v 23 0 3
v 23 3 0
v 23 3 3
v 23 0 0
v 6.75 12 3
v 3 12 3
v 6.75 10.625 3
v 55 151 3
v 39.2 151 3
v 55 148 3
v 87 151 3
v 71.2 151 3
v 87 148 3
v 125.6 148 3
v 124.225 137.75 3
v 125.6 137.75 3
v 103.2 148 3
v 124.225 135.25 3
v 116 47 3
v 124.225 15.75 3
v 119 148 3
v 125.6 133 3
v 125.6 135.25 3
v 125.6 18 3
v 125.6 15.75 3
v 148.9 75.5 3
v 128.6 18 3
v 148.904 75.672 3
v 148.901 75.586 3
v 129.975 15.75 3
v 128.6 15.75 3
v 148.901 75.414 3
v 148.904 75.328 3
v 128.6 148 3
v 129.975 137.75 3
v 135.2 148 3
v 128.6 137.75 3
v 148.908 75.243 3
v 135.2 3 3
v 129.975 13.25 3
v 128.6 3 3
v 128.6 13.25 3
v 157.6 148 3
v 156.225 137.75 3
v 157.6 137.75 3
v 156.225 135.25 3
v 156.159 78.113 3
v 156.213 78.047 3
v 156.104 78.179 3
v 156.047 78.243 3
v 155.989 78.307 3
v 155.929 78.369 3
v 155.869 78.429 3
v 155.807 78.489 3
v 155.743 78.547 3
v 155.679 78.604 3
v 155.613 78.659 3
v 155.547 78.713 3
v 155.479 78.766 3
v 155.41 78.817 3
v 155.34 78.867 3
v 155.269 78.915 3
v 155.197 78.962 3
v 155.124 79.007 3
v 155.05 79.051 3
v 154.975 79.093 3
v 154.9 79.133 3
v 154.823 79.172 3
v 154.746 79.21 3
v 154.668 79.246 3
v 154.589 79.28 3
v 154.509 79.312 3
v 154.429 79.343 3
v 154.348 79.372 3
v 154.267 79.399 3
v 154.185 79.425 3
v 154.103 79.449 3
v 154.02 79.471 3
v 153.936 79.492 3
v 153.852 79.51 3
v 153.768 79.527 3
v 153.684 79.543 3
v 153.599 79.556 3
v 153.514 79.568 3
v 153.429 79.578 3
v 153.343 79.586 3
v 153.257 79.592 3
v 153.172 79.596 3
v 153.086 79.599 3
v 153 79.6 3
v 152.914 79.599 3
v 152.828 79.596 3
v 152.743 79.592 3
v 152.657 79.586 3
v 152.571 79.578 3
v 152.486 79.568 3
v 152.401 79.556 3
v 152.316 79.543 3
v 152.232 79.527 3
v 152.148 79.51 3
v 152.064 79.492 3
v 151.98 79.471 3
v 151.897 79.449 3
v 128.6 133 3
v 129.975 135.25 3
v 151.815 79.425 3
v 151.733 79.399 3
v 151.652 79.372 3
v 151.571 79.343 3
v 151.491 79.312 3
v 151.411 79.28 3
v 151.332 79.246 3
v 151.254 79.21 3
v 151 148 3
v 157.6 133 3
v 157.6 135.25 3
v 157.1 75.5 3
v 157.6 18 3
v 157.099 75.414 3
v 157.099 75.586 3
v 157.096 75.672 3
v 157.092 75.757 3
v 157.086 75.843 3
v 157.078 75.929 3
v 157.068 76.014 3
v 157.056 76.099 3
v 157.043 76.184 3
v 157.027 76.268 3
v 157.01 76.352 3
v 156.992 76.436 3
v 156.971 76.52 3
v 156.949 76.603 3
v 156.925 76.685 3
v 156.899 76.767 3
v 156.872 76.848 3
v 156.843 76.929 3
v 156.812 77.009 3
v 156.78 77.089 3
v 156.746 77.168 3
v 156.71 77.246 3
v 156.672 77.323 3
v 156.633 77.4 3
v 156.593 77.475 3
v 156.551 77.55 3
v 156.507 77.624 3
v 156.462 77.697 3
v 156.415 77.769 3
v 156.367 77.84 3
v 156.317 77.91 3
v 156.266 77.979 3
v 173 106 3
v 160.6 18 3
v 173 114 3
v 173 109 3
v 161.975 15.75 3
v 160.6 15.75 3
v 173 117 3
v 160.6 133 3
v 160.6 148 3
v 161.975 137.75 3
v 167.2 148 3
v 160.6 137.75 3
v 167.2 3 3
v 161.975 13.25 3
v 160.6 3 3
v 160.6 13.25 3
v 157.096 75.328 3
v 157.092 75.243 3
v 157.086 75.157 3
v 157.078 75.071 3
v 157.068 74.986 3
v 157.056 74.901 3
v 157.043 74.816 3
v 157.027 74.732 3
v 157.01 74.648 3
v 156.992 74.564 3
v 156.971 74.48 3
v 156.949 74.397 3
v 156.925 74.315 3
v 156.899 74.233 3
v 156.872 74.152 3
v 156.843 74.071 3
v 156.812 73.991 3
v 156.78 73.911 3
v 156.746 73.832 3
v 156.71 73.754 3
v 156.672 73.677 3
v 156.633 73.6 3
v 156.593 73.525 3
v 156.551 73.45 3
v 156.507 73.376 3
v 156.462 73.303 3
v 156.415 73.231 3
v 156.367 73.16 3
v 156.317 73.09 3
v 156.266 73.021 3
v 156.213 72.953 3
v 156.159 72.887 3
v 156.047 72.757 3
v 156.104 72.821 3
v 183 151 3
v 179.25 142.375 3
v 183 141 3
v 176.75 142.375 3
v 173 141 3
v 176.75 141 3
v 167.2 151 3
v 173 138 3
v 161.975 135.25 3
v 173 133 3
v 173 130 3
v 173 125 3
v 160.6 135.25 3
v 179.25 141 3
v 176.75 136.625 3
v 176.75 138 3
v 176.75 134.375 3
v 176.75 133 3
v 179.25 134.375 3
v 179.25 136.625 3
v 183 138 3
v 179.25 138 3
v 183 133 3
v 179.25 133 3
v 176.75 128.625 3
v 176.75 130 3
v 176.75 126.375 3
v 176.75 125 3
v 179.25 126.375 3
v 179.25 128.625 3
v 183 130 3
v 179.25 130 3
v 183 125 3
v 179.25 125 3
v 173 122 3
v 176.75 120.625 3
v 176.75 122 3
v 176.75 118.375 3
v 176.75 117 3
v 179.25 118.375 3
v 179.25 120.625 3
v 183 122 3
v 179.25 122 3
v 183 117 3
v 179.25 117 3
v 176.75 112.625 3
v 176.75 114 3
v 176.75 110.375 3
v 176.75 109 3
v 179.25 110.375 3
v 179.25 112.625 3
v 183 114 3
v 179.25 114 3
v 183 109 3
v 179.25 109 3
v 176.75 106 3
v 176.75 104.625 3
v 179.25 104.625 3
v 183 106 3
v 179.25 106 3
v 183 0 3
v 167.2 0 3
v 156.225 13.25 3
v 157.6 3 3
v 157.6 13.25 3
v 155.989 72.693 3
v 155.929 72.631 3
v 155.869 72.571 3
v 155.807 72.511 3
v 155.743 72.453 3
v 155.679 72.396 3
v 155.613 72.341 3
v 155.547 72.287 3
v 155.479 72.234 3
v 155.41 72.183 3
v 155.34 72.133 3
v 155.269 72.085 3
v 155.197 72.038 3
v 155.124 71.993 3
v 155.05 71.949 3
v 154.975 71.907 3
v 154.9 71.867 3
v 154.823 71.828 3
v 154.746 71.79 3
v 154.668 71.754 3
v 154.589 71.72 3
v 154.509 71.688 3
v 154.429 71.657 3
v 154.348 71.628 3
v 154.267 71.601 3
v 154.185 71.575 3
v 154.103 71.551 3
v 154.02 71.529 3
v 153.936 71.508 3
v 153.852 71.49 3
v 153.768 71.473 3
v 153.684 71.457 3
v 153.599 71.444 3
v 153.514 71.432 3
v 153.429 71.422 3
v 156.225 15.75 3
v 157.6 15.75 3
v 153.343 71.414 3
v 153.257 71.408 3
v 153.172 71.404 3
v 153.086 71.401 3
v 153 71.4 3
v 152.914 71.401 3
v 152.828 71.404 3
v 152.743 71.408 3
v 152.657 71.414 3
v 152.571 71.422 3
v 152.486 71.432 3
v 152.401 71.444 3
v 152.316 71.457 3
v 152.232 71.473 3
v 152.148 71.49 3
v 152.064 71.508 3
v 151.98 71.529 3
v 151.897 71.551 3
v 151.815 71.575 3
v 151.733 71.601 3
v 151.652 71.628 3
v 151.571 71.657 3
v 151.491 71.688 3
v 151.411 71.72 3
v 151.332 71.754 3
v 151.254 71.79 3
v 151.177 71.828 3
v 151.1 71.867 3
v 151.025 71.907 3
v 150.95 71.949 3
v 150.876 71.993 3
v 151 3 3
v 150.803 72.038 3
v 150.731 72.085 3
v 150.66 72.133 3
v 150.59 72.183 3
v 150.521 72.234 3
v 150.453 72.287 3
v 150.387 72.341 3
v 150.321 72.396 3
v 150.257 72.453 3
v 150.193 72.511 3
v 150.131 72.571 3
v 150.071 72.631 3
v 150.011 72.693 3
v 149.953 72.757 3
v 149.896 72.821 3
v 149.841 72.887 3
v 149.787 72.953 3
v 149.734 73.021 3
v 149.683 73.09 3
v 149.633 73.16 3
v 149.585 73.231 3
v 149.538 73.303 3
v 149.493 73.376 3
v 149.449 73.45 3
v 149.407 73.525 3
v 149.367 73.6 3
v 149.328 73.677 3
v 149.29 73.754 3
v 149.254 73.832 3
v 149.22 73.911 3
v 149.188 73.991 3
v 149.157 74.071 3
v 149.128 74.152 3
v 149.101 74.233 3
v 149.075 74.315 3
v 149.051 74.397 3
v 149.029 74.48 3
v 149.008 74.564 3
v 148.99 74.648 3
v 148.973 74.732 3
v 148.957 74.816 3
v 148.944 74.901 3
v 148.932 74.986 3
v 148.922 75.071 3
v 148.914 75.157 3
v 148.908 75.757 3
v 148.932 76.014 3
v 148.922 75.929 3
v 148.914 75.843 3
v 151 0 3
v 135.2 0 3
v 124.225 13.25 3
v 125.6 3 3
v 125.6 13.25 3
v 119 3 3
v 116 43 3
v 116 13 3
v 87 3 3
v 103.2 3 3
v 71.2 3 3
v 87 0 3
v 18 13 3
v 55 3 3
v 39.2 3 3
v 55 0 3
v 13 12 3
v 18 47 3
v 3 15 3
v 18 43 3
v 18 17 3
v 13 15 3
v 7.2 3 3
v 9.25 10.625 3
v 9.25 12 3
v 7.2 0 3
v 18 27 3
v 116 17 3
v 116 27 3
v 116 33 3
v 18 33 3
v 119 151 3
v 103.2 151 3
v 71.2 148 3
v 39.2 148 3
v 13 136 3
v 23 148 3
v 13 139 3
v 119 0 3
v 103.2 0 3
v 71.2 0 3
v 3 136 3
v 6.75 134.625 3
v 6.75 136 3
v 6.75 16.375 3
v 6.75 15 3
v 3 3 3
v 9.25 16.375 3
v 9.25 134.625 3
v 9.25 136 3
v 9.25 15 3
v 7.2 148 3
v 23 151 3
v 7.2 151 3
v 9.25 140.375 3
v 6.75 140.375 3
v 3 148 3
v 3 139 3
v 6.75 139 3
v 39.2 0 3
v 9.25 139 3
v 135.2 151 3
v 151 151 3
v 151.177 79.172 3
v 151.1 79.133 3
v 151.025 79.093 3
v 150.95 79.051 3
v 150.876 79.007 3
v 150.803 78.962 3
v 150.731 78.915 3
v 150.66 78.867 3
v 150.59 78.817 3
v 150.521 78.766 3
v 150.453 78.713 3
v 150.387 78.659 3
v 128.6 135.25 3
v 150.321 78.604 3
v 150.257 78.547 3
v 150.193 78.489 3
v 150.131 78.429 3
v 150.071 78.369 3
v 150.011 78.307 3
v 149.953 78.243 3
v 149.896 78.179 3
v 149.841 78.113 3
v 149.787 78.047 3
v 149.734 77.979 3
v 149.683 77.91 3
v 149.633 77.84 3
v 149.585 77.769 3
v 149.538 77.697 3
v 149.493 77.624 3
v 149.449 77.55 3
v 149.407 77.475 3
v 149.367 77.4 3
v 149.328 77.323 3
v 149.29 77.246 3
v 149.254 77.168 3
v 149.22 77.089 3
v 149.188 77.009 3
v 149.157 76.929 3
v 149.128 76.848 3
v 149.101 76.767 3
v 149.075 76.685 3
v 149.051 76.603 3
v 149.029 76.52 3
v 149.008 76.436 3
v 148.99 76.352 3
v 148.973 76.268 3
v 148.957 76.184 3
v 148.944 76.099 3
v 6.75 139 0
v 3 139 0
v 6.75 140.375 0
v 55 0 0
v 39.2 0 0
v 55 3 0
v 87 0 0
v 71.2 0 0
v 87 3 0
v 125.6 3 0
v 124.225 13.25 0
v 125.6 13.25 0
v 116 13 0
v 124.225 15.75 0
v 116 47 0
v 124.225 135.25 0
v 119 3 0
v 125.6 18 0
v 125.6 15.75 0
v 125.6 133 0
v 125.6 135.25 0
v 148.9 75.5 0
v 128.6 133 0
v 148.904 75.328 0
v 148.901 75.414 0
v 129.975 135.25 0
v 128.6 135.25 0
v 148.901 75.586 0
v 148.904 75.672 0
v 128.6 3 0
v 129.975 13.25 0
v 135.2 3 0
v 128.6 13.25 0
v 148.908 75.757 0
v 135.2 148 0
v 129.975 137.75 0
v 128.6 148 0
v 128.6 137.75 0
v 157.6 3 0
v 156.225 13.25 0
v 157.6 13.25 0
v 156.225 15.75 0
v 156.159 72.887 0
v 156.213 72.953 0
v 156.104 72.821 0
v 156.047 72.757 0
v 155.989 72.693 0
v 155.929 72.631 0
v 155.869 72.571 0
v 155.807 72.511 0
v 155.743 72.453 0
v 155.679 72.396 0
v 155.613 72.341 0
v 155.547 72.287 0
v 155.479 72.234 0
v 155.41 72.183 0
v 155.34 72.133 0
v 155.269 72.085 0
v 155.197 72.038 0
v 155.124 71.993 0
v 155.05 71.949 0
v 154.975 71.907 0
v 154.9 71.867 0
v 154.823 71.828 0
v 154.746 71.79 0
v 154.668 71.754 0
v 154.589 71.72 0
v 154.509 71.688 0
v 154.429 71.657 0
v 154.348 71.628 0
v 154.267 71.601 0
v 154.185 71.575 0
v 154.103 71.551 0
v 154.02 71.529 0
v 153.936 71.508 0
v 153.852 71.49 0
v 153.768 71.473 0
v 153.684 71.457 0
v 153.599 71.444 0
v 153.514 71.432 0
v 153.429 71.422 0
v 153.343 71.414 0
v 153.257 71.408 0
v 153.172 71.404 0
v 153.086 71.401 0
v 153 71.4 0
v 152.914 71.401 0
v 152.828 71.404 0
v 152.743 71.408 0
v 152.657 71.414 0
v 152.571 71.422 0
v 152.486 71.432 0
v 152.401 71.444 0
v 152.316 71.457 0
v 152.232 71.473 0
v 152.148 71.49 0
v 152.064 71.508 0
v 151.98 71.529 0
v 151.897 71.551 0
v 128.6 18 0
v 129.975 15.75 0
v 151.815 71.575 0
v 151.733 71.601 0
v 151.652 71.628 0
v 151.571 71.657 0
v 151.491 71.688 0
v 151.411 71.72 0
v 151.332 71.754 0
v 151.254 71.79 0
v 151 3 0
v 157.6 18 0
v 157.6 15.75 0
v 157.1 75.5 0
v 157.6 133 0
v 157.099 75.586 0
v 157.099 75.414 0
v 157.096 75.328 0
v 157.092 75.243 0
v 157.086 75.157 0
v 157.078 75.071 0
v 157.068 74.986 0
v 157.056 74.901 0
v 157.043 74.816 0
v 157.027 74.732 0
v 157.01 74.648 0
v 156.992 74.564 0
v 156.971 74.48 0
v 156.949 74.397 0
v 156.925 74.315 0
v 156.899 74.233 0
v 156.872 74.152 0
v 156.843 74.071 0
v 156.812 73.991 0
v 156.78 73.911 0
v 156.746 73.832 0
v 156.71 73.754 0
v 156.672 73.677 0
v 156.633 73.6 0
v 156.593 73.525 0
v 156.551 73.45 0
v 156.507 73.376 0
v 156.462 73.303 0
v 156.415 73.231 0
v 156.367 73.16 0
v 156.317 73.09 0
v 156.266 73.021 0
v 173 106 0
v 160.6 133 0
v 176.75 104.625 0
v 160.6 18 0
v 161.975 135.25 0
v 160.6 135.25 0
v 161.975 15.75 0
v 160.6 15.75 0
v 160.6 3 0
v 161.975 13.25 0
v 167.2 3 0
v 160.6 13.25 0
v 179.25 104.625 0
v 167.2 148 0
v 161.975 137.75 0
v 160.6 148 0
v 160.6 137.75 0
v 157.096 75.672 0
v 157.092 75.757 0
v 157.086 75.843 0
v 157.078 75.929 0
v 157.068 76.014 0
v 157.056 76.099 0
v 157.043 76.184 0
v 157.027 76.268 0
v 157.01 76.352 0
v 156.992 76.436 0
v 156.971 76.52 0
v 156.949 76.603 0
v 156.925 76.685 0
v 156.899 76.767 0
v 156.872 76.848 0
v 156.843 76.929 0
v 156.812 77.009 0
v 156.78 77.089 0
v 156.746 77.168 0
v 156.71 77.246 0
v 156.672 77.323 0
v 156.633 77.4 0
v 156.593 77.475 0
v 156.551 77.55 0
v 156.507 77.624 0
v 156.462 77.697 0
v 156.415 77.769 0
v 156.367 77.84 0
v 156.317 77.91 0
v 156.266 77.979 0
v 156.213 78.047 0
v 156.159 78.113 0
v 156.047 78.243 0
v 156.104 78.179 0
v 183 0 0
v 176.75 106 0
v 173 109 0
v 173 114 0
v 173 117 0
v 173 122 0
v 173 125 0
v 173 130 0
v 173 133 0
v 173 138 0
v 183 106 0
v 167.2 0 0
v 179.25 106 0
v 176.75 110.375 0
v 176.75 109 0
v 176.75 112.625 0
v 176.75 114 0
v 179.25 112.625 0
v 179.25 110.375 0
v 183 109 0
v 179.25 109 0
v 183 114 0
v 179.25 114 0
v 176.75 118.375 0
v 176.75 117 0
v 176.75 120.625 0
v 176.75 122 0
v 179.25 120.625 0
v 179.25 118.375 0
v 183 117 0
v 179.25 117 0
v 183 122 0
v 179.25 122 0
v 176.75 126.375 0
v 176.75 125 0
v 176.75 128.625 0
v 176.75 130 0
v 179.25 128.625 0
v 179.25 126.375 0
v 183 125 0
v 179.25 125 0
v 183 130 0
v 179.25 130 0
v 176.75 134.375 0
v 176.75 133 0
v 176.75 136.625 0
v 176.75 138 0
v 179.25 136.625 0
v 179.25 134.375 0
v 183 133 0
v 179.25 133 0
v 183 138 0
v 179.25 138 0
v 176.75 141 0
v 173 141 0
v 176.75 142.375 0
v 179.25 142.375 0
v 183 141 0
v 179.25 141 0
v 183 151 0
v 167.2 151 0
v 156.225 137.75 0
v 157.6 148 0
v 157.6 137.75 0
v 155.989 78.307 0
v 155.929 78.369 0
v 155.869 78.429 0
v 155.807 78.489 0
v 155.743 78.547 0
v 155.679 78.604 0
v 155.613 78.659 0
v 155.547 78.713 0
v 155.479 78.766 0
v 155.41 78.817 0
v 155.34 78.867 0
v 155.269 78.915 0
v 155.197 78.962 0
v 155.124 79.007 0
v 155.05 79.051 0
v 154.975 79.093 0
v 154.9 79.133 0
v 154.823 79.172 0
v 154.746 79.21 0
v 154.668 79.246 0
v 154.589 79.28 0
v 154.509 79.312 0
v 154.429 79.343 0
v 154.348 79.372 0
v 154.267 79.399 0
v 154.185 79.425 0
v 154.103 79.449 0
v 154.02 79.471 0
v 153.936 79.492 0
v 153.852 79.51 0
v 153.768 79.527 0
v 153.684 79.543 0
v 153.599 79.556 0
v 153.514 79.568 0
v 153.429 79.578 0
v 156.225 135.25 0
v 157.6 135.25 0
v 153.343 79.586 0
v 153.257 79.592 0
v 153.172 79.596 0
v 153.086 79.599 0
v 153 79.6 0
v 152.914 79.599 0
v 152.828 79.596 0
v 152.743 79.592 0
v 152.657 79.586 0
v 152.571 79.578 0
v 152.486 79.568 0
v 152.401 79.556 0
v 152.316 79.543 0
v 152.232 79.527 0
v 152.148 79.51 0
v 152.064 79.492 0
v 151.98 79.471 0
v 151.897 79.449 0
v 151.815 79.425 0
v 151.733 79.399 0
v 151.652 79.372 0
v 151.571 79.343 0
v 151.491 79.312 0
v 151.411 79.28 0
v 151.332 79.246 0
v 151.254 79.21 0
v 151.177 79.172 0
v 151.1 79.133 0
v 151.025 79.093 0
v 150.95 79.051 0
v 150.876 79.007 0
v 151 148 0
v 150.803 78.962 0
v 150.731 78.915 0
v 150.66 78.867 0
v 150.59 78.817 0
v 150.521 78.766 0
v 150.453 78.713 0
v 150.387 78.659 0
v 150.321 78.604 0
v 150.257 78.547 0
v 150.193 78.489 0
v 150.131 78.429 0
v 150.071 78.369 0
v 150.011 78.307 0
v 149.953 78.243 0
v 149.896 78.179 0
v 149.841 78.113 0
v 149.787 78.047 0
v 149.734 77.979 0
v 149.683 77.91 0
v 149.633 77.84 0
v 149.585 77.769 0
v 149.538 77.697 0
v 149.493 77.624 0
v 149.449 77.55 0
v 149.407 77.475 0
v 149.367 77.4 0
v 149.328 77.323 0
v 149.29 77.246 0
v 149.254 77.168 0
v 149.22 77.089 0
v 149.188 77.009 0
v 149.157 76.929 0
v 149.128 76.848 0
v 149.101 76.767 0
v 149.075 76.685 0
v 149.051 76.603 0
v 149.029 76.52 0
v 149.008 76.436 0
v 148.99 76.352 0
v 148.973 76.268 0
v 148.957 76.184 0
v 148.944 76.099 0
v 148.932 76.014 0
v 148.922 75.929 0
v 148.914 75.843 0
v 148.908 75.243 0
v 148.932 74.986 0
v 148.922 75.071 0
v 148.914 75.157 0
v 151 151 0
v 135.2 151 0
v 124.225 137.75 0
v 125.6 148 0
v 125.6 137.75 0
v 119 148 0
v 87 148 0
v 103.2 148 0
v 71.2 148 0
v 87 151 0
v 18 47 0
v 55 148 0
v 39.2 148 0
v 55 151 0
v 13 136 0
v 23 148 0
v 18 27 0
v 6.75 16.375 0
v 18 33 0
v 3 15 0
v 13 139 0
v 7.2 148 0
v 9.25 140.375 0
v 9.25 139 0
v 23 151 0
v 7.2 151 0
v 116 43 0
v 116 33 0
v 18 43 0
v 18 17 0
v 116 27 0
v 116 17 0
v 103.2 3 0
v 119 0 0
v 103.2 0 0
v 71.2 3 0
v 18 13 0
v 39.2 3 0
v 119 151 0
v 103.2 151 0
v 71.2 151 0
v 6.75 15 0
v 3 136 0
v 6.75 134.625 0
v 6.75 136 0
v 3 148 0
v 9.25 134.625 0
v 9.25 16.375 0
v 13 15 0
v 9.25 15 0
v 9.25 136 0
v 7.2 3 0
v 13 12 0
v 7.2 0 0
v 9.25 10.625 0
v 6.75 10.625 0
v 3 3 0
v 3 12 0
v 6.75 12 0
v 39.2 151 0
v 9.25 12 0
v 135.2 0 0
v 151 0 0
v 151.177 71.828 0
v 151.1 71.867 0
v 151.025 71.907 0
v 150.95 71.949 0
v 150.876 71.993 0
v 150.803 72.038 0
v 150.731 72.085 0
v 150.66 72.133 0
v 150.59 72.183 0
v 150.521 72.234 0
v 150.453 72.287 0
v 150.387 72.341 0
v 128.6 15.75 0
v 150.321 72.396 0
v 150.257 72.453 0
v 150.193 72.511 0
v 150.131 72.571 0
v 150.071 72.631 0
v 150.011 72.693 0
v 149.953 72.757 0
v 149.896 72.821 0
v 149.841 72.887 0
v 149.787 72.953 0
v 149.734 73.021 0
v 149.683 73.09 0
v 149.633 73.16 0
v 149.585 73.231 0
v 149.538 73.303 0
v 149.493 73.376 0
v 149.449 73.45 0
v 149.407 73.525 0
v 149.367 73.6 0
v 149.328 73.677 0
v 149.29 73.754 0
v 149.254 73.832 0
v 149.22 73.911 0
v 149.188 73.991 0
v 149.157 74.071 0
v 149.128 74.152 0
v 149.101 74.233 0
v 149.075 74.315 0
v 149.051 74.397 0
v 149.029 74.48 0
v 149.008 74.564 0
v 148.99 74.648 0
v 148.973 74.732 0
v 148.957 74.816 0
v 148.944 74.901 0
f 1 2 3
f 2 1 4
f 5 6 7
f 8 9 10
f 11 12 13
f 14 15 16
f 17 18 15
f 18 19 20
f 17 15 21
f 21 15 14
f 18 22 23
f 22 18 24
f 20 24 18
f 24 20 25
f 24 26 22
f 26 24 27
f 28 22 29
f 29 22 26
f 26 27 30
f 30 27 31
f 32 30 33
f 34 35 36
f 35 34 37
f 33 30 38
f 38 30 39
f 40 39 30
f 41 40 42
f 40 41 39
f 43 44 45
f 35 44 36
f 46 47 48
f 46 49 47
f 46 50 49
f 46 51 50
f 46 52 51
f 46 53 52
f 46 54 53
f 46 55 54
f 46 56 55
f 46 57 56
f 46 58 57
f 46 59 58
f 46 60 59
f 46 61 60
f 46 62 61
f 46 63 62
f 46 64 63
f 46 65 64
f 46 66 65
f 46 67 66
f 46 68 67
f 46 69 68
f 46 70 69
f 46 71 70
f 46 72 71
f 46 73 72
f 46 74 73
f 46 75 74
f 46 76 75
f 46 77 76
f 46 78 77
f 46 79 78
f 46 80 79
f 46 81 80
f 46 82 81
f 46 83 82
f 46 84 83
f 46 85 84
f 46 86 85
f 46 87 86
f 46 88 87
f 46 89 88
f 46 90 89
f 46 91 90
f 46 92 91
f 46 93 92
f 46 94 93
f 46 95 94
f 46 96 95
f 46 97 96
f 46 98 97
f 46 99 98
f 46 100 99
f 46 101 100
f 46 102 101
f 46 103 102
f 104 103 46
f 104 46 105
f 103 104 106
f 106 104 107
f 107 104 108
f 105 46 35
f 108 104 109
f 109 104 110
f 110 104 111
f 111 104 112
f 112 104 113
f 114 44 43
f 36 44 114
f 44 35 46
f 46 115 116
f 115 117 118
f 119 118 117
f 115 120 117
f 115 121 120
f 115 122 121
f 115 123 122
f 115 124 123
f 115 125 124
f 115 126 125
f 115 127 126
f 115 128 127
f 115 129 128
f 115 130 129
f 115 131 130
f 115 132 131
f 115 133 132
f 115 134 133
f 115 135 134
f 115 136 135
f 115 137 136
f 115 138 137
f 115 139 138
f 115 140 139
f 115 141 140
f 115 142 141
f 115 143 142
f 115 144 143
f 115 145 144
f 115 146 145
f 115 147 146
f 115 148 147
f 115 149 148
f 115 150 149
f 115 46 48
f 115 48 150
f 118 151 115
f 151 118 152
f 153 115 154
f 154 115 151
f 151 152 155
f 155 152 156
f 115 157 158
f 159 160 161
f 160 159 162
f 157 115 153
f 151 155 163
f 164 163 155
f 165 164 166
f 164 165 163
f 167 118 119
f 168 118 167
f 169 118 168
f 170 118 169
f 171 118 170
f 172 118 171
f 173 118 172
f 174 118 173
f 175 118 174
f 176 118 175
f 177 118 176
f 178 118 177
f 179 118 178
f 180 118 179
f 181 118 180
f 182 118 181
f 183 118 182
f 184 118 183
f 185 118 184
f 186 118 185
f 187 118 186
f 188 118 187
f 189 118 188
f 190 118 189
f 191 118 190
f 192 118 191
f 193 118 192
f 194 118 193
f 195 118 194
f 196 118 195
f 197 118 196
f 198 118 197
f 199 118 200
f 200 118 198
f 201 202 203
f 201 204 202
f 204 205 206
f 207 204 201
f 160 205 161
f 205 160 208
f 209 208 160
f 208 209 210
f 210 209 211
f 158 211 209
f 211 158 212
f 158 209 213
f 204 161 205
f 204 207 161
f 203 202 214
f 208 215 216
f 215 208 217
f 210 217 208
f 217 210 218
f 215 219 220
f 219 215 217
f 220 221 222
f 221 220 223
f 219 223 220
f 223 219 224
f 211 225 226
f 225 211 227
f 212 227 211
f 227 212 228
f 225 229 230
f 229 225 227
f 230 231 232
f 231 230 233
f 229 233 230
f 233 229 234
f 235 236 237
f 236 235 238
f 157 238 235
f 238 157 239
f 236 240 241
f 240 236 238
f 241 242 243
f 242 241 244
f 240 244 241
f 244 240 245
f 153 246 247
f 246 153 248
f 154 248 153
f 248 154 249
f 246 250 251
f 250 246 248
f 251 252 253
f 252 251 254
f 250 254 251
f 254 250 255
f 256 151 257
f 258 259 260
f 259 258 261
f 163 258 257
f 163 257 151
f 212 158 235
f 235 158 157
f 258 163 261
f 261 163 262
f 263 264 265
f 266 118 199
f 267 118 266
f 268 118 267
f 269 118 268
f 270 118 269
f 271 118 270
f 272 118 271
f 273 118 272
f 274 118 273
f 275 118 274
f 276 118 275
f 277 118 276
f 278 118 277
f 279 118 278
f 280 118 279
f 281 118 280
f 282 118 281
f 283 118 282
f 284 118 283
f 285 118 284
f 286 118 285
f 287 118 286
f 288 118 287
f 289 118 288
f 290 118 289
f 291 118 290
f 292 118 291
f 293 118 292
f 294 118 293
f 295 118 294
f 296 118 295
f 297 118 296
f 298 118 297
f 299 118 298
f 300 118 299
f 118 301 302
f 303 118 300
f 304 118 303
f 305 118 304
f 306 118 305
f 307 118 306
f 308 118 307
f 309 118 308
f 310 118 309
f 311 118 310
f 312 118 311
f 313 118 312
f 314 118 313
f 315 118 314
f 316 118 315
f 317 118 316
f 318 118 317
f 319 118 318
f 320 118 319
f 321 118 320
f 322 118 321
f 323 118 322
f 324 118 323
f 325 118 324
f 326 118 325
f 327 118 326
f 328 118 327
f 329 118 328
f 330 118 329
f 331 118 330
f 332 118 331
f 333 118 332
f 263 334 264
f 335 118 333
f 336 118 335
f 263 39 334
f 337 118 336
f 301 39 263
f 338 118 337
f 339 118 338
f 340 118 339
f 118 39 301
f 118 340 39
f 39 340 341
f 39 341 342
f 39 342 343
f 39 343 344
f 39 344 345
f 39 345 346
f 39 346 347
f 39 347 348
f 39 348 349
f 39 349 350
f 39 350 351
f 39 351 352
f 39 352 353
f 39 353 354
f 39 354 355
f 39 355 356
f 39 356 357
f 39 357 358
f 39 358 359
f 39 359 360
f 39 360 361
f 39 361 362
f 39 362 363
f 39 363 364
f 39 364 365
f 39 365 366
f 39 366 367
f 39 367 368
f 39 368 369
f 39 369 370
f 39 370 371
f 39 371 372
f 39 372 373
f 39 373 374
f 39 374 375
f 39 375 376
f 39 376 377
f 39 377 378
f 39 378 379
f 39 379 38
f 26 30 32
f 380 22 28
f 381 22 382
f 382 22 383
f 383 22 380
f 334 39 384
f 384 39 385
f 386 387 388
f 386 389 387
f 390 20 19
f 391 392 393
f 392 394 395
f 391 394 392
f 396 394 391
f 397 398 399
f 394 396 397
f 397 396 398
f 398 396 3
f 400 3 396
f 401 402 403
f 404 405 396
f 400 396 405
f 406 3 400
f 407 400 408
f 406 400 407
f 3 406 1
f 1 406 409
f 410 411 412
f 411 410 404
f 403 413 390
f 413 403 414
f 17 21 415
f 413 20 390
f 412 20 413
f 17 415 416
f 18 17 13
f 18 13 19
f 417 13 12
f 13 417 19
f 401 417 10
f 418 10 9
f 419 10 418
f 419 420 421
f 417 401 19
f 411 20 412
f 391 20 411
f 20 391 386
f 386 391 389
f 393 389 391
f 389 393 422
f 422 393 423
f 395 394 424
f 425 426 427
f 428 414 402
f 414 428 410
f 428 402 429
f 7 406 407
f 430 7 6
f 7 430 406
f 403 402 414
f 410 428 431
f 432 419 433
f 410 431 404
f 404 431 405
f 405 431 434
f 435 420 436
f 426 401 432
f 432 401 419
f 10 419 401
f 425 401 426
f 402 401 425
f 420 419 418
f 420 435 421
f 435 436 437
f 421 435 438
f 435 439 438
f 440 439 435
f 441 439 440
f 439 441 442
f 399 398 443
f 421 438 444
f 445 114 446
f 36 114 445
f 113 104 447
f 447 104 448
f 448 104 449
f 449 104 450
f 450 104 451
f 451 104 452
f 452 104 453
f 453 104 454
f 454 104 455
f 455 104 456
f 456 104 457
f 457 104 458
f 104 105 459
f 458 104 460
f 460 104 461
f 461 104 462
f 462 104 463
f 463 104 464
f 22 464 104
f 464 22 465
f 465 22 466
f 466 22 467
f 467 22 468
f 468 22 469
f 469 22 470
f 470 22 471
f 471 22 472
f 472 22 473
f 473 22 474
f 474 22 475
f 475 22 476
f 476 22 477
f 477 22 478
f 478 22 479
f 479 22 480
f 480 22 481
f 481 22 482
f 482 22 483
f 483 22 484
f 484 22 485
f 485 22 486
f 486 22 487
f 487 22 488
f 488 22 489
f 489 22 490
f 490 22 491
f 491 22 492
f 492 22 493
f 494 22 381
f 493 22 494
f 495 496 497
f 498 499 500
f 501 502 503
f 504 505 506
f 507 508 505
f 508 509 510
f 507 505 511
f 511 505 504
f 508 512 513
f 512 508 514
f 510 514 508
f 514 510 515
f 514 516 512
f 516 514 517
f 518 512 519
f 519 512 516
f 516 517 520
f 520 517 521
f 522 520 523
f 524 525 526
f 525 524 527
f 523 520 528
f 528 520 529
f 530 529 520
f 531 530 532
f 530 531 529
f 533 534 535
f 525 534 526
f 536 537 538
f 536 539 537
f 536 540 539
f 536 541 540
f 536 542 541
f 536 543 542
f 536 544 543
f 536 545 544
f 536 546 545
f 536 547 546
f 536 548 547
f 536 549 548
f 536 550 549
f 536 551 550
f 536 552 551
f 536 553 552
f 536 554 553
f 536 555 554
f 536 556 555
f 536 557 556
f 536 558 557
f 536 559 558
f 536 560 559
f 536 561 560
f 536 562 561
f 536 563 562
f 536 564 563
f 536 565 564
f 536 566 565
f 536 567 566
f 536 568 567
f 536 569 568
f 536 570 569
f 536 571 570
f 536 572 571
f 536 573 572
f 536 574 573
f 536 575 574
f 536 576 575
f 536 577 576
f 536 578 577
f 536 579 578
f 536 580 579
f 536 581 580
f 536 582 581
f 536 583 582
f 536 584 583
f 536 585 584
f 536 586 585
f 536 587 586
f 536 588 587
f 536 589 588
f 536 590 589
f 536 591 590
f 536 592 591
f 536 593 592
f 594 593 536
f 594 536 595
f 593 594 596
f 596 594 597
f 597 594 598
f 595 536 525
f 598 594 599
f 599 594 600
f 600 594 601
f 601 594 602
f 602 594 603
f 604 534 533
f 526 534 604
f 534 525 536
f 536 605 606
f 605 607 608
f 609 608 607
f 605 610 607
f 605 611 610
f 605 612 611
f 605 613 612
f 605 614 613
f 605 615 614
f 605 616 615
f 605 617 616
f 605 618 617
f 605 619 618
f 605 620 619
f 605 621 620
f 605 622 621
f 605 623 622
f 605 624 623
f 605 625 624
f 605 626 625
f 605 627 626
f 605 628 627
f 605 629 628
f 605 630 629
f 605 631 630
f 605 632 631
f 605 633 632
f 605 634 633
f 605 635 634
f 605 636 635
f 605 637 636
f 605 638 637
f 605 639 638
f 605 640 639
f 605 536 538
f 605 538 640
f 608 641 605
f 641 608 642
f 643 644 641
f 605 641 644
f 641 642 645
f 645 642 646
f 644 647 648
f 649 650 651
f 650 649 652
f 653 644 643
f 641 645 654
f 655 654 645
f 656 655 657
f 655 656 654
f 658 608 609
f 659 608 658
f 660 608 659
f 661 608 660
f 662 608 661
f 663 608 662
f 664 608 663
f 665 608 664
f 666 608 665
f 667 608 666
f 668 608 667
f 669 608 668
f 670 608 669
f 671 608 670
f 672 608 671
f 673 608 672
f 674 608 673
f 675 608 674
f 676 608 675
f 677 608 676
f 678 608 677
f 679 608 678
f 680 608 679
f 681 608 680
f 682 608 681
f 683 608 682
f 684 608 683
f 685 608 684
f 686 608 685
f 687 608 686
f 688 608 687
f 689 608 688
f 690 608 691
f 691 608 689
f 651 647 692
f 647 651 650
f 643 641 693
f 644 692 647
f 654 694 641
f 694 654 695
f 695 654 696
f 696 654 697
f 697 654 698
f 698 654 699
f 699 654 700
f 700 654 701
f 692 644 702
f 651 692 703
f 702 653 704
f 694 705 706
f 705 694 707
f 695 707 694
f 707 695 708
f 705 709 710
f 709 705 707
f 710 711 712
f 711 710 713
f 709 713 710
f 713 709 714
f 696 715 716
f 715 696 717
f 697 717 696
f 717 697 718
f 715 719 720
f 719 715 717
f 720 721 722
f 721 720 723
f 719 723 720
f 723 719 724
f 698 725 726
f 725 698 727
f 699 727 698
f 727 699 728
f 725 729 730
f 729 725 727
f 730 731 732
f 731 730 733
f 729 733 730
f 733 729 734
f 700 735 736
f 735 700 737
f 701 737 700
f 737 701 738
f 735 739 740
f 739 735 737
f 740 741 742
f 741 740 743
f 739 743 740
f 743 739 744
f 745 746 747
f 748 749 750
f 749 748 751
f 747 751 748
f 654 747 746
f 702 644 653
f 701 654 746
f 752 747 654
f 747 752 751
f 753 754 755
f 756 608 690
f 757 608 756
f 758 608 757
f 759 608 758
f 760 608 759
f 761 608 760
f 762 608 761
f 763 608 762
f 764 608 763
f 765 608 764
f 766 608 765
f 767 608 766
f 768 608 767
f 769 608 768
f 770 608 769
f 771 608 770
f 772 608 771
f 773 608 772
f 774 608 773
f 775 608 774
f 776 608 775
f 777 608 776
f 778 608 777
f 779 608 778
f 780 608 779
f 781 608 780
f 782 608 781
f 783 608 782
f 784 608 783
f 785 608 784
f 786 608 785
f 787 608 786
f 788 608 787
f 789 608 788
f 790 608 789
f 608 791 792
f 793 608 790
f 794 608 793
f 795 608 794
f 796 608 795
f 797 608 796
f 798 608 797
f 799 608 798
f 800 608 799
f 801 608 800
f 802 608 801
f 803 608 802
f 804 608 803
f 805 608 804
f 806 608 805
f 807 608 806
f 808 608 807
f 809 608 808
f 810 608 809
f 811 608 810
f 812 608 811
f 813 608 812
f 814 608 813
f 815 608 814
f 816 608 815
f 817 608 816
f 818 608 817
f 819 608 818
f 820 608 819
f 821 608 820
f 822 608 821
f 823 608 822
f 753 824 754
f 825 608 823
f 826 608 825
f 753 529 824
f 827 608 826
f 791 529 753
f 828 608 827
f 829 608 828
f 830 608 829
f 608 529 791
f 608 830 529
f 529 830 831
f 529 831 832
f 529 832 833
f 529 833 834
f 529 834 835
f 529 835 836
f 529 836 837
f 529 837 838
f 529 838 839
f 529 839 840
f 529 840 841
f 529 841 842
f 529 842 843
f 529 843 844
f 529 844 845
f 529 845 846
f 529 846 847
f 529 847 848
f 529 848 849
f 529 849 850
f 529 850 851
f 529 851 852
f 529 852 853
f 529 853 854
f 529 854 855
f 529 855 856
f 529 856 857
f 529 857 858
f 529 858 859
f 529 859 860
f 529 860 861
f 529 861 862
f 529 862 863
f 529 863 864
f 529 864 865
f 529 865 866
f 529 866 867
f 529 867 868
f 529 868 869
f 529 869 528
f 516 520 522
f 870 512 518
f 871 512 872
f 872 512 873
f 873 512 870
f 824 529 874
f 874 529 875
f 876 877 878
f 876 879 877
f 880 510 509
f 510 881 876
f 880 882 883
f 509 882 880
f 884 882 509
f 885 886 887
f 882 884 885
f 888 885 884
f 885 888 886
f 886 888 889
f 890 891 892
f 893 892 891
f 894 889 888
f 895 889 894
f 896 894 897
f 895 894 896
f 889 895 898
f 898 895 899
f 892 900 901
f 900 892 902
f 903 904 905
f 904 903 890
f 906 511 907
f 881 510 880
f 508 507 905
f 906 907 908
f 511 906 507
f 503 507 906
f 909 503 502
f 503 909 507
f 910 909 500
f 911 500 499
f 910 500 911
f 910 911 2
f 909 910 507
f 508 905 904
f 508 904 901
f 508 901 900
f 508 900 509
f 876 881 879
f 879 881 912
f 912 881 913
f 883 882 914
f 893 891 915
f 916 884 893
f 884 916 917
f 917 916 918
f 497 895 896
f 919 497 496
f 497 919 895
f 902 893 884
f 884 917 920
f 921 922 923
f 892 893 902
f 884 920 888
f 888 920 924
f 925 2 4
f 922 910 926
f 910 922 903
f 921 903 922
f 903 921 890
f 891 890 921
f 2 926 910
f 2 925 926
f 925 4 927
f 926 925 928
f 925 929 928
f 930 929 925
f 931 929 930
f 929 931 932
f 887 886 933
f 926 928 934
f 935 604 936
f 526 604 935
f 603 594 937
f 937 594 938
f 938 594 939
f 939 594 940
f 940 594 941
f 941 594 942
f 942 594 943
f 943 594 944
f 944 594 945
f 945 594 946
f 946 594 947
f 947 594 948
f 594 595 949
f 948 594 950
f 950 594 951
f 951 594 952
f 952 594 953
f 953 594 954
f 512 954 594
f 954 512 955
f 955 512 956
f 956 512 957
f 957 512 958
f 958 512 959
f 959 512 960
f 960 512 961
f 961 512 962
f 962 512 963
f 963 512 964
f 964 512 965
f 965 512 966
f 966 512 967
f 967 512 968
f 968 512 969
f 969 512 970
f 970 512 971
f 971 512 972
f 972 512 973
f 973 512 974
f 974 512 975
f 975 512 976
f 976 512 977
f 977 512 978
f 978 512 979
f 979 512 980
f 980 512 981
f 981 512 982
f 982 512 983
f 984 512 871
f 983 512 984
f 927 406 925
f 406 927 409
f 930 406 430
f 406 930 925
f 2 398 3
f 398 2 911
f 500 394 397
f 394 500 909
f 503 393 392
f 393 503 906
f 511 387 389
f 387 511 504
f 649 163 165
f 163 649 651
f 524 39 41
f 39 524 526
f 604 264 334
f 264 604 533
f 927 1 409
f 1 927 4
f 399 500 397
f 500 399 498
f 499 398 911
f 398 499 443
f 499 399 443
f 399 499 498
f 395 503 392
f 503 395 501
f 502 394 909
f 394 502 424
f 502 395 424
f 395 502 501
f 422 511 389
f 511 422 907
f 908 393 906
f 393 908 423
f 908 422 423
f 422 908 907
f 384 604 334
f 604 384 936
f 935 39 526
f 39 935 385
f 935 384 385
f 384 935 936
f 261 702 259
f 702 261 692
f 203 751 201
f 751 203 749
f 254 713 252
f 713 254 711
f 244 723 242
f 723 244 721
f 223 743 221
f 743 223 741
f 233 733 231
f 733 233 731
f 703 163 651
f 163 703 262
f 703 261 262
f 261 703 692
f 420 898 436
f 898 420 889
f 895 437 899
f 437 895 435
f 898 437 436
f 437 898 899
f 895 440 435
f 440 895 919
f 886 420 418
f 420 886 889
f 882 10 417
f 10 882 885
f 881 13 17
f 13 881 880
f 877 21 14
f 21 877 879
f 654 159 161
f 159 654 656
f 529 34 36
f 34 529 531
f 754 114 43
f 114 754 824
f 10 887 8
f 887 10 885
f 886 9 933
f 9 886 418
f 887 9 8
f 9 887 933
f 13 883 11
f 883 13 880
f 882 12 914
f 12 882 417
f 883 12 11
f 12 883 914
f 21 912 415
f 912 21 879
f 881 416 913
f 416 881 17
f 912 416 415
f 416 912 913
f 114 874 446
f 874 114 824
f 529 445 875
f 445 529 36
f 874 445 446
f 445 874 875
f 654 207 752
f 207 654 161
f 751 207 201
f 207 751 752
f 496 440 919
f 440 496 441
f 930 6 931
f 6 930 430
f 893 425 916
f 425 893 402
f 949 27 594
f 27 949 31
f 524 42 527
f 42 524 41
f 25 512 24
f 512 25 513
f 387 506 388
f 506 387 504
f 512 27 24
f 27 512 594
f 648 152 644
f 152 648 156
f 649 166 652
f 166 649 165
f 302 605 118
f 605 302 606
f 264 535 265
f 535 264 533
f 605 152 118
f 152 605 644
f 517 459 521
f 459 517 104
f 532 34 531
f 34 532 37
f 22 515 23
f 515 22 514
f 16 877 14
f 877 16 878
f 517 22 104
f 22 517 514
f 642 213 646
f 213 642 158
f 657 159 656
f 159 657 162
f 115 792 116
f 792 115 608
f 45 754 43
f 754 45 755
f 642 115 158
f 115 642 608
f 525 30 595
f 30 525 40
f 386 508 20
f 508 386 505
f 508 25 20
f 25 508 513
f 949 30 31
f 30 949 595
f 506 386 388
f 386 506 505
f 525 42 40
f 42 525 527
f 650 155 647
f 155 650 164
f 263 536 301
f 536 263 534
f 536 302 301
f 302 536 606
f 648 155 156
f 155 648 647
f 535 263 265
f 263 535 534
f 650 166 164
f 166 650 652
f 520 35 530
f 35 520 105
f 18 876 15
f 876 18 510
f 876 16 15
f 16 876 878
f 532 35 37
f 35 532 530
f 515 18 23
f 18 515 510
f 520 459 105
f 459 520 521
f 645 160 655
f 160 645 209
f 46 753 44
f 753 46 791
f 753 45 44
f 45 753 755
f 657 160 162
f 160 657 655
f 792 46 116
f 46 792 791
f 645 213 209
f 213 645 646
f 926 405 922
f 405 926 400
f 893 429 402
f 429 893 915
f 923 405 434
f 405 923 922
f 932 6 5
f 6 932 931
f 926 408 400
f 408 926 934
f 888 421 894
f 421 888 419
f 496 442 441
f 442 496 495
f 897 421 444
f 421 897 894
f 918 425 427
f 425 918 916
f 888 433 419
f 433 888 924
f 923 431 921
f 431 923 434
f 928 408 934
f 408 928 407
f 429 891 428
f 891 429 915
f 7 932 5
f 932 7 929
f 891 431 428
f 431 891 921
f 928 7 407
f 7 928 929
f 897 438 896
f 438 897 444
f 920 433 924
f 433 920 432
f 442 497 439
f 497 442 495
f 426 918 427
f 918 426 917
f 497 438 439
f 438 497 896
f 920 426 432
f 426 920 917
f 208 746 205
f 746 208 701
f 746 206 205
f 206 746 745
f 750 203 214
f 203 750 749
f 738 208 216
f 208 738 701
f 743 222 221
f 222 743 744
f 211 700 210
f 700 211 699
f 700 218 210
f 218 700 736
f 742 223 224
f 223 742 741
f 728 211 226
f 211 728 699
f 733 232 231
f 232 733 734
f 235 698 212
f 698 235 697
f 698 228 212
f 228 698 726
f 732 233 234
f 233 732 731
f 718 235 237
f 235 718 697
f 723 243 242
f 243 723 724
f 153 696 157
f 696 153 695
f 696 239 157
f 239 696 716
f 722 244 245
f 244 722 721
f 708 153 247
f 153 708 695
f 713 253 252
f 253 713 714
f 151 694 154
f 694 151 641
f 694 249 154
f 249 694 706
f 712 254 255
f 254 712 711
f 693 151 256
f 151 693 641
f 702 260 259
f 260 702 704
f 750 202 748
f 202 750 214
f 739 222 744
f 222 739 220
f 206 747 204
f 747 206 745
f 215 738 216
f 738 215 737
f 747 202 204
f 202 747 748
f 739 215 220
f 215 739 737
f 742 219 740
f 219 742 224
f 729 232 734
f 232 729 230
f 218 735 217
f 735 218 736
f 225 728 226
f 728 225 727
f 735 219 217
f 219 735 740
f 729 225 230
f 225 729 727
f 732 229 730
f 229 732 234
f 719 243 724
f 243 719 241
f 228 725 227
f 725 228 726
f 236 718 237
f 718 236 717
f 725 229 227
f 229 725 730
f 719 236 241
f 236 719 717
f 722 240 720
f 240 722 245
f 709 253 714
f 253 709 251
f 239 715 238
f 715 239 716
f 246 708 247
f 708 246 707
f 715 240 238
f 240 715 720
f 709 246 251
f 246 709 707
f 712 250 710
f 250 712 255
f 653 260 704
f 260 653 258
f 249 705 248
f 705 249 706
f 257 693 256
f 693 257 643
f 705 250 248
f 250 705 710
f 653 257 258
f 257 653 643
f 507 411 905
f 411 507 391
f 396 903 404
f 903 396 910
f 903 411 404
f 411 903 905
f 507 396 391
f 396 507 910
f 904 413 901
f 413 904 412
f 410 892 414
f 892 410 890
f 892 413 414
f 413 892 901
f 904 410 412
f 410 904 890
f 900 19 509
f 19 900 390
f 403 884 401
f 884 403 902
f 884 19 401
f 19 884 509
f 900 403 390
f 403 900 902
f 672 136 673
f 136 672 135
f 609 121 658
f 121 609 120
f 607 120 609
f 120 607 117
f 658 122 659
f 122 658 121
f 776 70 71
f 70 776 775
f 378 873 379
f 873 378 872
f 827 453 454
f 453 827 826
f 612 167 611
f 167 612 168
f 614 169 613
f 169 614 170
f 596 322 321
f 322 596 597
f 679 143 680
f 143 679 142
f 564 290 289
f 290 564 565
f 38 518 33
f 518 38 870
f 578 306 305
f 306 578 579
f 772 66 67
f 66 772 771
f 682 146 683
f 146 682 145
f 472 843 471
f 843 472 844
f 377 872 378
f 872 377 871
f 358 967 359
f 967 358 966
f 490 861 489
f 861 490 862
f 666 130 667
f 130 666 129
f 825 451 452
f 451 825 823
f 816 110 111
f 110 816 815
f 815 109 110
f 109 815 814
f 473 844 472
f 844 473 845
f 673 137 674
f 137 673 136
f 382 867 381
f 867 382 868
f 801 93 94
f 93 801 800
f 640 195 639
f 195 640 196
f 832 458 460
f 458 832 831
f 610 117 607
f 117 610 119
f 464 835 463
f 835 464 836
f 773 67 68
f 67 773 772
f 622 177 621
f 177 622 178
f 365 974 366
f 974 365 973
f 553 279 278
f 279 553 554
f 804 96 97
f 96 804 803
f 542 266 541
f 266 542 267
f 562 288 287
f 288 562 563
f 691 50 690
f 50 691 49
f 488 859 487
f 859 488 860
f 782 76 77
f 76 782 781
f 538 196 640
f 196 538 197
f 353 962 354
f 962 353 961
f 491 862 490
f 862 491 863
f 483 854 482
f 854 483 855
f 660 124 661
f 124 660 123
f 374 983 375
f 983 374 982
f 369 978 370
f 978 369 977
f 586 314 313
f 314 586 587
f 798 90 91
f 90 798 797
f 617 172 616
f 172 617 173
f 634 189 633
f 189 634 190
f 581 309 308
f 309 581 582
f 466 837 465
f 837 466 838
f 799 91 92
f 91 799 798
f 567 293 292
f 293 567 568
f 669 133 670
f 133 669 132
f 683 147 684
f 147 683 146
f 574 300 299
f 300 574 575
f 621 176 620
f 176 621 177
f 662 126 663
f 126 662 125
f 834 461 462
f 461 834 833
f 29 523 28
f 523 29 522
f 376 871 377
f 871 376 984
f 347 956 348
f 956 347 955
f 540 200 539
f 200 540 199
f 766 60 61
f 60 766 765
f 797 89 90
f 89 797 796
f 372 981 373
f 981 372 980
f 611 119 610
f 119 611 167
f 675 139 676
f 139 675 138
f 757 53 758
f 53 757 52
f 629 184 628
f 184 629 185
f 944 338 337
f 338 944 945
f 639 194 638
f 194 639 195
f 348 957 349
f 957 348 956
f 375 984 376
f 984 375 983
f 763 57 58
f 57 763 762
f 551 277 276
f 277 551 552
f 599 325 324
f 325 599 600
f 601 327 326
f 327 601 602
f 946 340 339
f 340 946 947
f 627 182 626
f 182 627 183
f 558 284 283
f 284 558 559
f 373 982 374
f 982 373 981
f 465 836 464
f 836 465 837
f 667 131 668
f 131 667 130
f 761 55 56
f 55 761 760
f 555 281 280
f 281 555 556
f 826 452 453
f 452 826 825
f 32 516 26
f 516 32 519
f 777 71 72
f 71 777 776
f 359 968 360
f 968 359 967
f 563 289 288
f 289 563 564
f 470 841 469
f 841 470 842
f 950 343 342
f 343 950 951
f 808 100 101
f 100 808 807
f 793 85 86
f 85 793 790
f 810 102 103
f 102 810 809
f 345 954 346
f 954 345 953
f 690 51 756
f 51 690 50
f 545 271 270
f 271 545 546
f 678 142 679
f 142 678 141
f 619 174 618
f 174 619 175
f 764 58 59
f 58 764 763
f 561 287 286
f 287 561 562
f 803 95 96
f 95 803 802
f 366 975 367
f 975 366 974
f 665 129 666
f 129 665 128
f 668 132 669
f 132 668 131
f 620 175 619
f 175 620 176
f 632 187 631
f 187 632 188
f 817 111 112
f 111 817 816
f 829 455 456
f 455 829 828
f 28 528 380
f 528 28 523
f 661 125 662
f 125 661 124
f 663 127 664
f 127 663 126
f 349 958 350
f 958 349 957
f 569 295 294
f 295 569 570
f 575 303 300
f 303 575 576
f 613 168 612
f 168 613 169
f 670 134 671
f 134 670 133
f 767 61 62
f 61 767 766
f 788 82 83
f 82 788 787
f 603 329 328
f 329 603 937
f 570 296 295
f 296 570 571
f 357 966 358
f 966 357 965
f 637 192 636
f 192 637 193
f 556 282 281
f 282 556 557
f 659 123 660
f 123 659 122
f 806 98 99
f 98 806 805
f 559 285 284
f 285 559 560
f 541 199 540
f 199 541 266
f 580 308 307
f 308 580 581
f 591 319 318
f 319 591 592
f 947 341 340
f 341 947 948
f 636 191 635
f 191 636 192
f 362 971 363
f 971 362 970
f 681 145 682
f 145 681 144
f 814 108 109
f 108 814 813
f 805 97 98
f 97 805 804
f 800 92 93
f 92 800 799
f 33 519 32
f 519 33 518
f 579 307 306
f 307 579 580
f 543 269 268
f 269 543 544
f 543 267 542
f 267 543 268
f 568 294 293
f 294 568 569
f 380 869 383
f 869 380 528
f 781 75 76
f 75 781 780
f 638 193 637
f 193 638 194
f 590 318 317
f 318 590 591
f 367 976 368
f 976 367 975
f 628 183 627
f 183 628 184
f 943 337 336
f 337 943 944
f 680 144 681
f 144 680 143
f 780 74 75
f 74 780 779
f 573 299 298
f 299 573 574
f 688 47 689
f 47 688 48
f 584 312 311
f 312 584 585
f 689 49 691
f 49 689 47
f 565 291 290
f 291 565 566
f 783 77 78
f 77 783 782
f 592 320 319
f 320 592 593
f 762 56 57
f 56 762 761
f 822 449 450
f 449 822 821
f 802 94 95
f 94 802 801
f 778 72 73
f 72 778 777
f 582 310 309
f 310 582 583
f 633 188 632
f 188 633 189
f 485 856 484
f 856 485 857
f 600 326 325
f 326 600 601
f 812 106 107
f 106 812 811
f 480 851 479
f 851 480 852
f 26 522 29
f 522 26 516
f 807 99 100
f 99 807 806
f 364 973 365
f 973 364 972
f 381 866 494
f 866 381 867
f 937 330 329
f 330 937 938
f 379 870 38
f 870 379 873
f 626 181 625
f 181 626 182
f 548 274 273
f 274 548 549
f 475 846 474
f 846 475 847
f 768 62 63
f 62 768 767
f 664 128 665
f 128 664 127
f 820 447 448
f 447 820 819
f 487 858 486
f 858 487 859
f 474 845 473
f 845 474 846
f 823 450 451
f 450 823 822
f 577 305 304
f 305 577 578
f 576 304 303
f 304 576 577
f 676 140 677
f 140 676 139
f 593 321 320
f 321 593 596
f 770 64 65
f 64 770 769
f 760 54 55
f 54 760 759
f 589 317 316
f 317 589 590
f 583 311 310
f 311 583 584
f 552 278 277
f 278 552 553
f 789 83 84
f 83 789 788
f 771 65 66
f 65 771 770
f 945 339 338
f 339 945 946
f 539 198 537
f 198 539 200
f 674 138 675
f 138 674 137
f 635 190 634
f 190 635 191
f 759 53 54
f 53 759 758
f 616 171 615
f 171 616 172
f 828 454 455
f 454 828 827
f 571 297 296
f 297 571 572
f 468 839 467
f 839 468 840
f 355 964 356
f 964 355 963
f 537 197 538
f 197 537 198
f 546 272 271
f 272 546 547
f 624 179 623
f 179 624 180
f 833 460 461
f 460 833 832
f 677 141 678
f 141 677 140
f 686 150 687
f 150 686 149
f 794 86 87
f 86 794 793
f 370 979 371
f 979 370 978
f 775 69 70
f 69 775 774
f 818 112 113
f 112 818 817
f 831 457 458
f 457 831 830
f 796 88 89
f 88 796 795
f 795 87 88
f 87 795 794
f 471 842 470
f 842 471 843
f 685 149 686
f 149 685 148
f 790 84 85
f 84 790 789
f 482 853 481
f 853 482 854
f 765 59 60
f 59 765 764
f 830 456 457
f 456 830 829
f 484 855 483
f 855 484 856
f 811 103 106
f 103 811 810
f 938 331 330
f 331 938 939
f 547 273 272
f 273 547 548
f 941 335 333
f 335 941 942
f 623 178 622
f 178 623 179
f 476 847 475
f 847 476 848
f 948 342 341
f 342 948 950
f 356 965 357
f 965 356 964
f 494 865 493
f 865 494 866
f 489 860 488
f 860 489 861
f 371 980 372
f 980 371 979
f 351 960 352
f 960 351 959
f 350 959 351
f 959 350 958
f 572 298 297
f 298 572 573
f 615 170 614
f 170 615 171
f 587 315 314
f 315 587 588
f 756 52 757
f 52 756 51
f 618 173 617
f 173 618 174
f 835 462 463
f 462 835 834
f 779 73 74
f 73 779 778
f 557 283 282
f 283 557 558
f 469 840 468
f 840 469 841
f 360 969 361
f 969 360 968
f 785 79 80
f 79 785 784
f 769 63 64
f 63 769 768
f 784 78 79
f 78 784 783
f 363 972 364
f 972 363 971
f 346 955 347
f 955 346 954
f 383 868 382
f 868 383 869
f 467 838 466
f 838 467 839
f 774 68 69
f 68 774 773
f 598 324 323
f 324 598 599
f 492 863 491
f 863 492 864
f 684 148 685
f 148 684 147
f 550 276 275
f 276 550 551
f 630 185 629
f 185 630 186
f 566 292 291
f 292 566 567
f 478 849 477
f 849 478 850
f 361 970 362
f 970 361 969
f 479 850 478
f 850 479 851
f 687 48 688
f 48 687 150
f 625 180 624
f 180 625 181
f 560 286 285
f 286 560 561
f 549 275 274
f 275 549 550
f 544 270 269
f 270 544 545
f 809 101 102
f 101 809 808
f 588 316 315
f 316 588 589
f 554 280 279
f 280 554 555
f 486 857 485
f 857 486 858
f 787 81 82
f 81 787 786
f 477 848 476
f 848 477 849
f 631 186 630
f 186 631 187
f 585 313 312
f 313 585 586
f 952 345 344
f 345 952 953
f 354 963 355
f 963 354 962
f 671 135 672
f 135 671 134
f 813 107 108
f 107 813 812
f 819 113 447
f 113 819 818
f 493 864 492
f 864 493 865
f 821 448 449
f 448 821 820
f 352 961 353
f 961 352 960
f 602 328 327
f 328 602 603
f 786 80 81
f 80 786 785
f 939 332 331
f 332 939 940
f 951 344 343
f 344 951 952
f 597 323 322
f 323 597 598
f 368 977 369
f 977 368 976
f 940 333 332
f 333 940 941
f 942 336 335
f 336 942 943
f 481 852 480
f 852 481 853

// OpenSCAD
//next version - keep teeth length as a variable parameter
lct = 3; // Laser Cut thickness
t_length = 10;// length of t-slot screw
t_thick = 3;// diameter of t-slot screw
dim_x = 86 + 140 - 50 + t_length ; // Total size excluding lct, now 86
dim_y =  151;//height was 166 before, now 151
nut_dia = 5.75;// diameter of t-slot nut
nut_thick = 2.5;// thickness of t-slot nut
dia_c = 8.2; //diameter of center hole (changed from 8.1)
rad_c = dia_c/2;

tol = .1; //teeth tolerance
bthp = 12;//back t hole position (here back is left side)
fthp = 10;//fromt t hole position (here front is right side)
fth_sep =8; //front t hole separation

difference(){

//cuboid, teeth top & bottom
union(){
    translate([lct,lct,0])cube([dim_x-2*lct,dim_y-2*lct,lct]);//cuboid
    for(x=[lct+tol+4/*offset*/+tol/*as teeth r reduced by tol b4, it should be included in offset*/:32:dim_x-2*lct])translate([x,0,0])cube([16-2*tol,lct,lct]);//teeth bottom
    for(x=[lct+tol+4+tol:32:dim_x-2*lct])translate([x,dim_y-lct,0])cube([16-2*tol,lct,lct]);//teeth top
}

//screw holes top & bottom
union(){
    for(x=[lct+16+((16-t_thick)/2)+4/*offset*/+tol+96/*last_2_only_req*/:32:128 + 5/*greater than 4+tol is enough*/ + lct+16+((16-t_thick)/2)])/*x  and 32+x*/translate([x,0,0])color("red")cube([t_thick,t_length+8/*new screw*/,lct]);//screw hole bottom
    for(x=[lct+16+((16-t_thick)/2)+4+tol+96/*last_2_only_req*/:32:128+5 + lct+16+((16-t_thick)/2)])translate([x,dim_y-t_length-8/*new_screw*/,0])color("red")cube([t_thick,t_length+8/*new_screw*/,lct]);//screw hole top
}

//nut holes top & bottom 
union(){
    for(x=[(lct+16+((16-t_thick)/2))/*dist bw O and screwhole*/-((nut_dia-t_thick)/2)/*dist diff screwhole & nuthole*/+4+tol+96/*last_2_only_req*/:32:dim_x])translate([x,lct+(t_length-lct-nut_thick)/2+8/*new screw*/,0])cube([nut_dia,nut_thick,lct]);//nut hole bottom
    for(x=[(lct+16+((16-t_thick)/2))/*dist bw O and screwhole*/-((nut_dia-t_thick)/2)/*dist diff screwhole & nuthole*/+4+tol+96/*last_2_only_req*/:32:dim_x])translate([x,dim_y-lct-((t_length-lct-nut_thick)/2)-nut_thick-8/*new screw*/,0])cube([nut_dia,nut_thick,lct]);//nut hole top
}

//nut holes left & right
union(){
	for(y=[bthp,dim_y-bthp-t_thick])translate([lct/*lct added, change to 0 if required,tscrew will look small*/,y,0])cube([t_length,t_thick,lct]);//screwhole left side(back)
    for(y=[bthp-((nut_dia-t_thick)/2),dim_y-bthp-((nut_dia-t_thick)/2)-t_thick])translate([lct+((t_length-nut_thick)/2),y,0])cube([nut_thick,nut_dia,lct]);//nuthole left side(back)
    
    
    for(y=[dim_y-fthp-t_thick:-fth_sep:100])translate([dim_x-t_length-lct/*lct added*/,y,0])cube([t_length,t_thick,lct]);//screwhole right side(front)
    for(y=[dim_y-fthp-((nut_dia-t_thick)/2)-t_thick:-fth_sep:100])translate([dim_x-lct-((t_length-nut_thick)/2)-nut_thick,y,0])cube([nut_thick,nut_dia,lct]);//nuthole right side(front)
}

//center hole - 33mm from right of X dimension
translate([dim_x-33,dim_y/2,0])color("blue")cylinder(lct,r1=rad_c,r2=rad_c,center=false,$fn=300);

//motor holes
union(){
    translate([t_length+lct+5,t_length+3,0])cube([100-50+t_length+3-5+40,4,lct]);
    translate([t_length+lct+5,t_length+3+2/*half 4*/+15/* center to center*/-3,0])cube([100-50+t_length+3-5+40,6,lct]);
    translate([t_length+lct+5,t_length+3+2+30-2,0])cube([100-50+t_length+3-5+40,4,lct]);
}
//union(){//back cut hole for back part
//for(y=[bthp+(t_thick/2)-(10/2),dim_y-bthp-(t_thick/2)+//(10/2)])translate([0,y,0]cube([lct+lct,10/*front //part width*/,3]);
//}

}
